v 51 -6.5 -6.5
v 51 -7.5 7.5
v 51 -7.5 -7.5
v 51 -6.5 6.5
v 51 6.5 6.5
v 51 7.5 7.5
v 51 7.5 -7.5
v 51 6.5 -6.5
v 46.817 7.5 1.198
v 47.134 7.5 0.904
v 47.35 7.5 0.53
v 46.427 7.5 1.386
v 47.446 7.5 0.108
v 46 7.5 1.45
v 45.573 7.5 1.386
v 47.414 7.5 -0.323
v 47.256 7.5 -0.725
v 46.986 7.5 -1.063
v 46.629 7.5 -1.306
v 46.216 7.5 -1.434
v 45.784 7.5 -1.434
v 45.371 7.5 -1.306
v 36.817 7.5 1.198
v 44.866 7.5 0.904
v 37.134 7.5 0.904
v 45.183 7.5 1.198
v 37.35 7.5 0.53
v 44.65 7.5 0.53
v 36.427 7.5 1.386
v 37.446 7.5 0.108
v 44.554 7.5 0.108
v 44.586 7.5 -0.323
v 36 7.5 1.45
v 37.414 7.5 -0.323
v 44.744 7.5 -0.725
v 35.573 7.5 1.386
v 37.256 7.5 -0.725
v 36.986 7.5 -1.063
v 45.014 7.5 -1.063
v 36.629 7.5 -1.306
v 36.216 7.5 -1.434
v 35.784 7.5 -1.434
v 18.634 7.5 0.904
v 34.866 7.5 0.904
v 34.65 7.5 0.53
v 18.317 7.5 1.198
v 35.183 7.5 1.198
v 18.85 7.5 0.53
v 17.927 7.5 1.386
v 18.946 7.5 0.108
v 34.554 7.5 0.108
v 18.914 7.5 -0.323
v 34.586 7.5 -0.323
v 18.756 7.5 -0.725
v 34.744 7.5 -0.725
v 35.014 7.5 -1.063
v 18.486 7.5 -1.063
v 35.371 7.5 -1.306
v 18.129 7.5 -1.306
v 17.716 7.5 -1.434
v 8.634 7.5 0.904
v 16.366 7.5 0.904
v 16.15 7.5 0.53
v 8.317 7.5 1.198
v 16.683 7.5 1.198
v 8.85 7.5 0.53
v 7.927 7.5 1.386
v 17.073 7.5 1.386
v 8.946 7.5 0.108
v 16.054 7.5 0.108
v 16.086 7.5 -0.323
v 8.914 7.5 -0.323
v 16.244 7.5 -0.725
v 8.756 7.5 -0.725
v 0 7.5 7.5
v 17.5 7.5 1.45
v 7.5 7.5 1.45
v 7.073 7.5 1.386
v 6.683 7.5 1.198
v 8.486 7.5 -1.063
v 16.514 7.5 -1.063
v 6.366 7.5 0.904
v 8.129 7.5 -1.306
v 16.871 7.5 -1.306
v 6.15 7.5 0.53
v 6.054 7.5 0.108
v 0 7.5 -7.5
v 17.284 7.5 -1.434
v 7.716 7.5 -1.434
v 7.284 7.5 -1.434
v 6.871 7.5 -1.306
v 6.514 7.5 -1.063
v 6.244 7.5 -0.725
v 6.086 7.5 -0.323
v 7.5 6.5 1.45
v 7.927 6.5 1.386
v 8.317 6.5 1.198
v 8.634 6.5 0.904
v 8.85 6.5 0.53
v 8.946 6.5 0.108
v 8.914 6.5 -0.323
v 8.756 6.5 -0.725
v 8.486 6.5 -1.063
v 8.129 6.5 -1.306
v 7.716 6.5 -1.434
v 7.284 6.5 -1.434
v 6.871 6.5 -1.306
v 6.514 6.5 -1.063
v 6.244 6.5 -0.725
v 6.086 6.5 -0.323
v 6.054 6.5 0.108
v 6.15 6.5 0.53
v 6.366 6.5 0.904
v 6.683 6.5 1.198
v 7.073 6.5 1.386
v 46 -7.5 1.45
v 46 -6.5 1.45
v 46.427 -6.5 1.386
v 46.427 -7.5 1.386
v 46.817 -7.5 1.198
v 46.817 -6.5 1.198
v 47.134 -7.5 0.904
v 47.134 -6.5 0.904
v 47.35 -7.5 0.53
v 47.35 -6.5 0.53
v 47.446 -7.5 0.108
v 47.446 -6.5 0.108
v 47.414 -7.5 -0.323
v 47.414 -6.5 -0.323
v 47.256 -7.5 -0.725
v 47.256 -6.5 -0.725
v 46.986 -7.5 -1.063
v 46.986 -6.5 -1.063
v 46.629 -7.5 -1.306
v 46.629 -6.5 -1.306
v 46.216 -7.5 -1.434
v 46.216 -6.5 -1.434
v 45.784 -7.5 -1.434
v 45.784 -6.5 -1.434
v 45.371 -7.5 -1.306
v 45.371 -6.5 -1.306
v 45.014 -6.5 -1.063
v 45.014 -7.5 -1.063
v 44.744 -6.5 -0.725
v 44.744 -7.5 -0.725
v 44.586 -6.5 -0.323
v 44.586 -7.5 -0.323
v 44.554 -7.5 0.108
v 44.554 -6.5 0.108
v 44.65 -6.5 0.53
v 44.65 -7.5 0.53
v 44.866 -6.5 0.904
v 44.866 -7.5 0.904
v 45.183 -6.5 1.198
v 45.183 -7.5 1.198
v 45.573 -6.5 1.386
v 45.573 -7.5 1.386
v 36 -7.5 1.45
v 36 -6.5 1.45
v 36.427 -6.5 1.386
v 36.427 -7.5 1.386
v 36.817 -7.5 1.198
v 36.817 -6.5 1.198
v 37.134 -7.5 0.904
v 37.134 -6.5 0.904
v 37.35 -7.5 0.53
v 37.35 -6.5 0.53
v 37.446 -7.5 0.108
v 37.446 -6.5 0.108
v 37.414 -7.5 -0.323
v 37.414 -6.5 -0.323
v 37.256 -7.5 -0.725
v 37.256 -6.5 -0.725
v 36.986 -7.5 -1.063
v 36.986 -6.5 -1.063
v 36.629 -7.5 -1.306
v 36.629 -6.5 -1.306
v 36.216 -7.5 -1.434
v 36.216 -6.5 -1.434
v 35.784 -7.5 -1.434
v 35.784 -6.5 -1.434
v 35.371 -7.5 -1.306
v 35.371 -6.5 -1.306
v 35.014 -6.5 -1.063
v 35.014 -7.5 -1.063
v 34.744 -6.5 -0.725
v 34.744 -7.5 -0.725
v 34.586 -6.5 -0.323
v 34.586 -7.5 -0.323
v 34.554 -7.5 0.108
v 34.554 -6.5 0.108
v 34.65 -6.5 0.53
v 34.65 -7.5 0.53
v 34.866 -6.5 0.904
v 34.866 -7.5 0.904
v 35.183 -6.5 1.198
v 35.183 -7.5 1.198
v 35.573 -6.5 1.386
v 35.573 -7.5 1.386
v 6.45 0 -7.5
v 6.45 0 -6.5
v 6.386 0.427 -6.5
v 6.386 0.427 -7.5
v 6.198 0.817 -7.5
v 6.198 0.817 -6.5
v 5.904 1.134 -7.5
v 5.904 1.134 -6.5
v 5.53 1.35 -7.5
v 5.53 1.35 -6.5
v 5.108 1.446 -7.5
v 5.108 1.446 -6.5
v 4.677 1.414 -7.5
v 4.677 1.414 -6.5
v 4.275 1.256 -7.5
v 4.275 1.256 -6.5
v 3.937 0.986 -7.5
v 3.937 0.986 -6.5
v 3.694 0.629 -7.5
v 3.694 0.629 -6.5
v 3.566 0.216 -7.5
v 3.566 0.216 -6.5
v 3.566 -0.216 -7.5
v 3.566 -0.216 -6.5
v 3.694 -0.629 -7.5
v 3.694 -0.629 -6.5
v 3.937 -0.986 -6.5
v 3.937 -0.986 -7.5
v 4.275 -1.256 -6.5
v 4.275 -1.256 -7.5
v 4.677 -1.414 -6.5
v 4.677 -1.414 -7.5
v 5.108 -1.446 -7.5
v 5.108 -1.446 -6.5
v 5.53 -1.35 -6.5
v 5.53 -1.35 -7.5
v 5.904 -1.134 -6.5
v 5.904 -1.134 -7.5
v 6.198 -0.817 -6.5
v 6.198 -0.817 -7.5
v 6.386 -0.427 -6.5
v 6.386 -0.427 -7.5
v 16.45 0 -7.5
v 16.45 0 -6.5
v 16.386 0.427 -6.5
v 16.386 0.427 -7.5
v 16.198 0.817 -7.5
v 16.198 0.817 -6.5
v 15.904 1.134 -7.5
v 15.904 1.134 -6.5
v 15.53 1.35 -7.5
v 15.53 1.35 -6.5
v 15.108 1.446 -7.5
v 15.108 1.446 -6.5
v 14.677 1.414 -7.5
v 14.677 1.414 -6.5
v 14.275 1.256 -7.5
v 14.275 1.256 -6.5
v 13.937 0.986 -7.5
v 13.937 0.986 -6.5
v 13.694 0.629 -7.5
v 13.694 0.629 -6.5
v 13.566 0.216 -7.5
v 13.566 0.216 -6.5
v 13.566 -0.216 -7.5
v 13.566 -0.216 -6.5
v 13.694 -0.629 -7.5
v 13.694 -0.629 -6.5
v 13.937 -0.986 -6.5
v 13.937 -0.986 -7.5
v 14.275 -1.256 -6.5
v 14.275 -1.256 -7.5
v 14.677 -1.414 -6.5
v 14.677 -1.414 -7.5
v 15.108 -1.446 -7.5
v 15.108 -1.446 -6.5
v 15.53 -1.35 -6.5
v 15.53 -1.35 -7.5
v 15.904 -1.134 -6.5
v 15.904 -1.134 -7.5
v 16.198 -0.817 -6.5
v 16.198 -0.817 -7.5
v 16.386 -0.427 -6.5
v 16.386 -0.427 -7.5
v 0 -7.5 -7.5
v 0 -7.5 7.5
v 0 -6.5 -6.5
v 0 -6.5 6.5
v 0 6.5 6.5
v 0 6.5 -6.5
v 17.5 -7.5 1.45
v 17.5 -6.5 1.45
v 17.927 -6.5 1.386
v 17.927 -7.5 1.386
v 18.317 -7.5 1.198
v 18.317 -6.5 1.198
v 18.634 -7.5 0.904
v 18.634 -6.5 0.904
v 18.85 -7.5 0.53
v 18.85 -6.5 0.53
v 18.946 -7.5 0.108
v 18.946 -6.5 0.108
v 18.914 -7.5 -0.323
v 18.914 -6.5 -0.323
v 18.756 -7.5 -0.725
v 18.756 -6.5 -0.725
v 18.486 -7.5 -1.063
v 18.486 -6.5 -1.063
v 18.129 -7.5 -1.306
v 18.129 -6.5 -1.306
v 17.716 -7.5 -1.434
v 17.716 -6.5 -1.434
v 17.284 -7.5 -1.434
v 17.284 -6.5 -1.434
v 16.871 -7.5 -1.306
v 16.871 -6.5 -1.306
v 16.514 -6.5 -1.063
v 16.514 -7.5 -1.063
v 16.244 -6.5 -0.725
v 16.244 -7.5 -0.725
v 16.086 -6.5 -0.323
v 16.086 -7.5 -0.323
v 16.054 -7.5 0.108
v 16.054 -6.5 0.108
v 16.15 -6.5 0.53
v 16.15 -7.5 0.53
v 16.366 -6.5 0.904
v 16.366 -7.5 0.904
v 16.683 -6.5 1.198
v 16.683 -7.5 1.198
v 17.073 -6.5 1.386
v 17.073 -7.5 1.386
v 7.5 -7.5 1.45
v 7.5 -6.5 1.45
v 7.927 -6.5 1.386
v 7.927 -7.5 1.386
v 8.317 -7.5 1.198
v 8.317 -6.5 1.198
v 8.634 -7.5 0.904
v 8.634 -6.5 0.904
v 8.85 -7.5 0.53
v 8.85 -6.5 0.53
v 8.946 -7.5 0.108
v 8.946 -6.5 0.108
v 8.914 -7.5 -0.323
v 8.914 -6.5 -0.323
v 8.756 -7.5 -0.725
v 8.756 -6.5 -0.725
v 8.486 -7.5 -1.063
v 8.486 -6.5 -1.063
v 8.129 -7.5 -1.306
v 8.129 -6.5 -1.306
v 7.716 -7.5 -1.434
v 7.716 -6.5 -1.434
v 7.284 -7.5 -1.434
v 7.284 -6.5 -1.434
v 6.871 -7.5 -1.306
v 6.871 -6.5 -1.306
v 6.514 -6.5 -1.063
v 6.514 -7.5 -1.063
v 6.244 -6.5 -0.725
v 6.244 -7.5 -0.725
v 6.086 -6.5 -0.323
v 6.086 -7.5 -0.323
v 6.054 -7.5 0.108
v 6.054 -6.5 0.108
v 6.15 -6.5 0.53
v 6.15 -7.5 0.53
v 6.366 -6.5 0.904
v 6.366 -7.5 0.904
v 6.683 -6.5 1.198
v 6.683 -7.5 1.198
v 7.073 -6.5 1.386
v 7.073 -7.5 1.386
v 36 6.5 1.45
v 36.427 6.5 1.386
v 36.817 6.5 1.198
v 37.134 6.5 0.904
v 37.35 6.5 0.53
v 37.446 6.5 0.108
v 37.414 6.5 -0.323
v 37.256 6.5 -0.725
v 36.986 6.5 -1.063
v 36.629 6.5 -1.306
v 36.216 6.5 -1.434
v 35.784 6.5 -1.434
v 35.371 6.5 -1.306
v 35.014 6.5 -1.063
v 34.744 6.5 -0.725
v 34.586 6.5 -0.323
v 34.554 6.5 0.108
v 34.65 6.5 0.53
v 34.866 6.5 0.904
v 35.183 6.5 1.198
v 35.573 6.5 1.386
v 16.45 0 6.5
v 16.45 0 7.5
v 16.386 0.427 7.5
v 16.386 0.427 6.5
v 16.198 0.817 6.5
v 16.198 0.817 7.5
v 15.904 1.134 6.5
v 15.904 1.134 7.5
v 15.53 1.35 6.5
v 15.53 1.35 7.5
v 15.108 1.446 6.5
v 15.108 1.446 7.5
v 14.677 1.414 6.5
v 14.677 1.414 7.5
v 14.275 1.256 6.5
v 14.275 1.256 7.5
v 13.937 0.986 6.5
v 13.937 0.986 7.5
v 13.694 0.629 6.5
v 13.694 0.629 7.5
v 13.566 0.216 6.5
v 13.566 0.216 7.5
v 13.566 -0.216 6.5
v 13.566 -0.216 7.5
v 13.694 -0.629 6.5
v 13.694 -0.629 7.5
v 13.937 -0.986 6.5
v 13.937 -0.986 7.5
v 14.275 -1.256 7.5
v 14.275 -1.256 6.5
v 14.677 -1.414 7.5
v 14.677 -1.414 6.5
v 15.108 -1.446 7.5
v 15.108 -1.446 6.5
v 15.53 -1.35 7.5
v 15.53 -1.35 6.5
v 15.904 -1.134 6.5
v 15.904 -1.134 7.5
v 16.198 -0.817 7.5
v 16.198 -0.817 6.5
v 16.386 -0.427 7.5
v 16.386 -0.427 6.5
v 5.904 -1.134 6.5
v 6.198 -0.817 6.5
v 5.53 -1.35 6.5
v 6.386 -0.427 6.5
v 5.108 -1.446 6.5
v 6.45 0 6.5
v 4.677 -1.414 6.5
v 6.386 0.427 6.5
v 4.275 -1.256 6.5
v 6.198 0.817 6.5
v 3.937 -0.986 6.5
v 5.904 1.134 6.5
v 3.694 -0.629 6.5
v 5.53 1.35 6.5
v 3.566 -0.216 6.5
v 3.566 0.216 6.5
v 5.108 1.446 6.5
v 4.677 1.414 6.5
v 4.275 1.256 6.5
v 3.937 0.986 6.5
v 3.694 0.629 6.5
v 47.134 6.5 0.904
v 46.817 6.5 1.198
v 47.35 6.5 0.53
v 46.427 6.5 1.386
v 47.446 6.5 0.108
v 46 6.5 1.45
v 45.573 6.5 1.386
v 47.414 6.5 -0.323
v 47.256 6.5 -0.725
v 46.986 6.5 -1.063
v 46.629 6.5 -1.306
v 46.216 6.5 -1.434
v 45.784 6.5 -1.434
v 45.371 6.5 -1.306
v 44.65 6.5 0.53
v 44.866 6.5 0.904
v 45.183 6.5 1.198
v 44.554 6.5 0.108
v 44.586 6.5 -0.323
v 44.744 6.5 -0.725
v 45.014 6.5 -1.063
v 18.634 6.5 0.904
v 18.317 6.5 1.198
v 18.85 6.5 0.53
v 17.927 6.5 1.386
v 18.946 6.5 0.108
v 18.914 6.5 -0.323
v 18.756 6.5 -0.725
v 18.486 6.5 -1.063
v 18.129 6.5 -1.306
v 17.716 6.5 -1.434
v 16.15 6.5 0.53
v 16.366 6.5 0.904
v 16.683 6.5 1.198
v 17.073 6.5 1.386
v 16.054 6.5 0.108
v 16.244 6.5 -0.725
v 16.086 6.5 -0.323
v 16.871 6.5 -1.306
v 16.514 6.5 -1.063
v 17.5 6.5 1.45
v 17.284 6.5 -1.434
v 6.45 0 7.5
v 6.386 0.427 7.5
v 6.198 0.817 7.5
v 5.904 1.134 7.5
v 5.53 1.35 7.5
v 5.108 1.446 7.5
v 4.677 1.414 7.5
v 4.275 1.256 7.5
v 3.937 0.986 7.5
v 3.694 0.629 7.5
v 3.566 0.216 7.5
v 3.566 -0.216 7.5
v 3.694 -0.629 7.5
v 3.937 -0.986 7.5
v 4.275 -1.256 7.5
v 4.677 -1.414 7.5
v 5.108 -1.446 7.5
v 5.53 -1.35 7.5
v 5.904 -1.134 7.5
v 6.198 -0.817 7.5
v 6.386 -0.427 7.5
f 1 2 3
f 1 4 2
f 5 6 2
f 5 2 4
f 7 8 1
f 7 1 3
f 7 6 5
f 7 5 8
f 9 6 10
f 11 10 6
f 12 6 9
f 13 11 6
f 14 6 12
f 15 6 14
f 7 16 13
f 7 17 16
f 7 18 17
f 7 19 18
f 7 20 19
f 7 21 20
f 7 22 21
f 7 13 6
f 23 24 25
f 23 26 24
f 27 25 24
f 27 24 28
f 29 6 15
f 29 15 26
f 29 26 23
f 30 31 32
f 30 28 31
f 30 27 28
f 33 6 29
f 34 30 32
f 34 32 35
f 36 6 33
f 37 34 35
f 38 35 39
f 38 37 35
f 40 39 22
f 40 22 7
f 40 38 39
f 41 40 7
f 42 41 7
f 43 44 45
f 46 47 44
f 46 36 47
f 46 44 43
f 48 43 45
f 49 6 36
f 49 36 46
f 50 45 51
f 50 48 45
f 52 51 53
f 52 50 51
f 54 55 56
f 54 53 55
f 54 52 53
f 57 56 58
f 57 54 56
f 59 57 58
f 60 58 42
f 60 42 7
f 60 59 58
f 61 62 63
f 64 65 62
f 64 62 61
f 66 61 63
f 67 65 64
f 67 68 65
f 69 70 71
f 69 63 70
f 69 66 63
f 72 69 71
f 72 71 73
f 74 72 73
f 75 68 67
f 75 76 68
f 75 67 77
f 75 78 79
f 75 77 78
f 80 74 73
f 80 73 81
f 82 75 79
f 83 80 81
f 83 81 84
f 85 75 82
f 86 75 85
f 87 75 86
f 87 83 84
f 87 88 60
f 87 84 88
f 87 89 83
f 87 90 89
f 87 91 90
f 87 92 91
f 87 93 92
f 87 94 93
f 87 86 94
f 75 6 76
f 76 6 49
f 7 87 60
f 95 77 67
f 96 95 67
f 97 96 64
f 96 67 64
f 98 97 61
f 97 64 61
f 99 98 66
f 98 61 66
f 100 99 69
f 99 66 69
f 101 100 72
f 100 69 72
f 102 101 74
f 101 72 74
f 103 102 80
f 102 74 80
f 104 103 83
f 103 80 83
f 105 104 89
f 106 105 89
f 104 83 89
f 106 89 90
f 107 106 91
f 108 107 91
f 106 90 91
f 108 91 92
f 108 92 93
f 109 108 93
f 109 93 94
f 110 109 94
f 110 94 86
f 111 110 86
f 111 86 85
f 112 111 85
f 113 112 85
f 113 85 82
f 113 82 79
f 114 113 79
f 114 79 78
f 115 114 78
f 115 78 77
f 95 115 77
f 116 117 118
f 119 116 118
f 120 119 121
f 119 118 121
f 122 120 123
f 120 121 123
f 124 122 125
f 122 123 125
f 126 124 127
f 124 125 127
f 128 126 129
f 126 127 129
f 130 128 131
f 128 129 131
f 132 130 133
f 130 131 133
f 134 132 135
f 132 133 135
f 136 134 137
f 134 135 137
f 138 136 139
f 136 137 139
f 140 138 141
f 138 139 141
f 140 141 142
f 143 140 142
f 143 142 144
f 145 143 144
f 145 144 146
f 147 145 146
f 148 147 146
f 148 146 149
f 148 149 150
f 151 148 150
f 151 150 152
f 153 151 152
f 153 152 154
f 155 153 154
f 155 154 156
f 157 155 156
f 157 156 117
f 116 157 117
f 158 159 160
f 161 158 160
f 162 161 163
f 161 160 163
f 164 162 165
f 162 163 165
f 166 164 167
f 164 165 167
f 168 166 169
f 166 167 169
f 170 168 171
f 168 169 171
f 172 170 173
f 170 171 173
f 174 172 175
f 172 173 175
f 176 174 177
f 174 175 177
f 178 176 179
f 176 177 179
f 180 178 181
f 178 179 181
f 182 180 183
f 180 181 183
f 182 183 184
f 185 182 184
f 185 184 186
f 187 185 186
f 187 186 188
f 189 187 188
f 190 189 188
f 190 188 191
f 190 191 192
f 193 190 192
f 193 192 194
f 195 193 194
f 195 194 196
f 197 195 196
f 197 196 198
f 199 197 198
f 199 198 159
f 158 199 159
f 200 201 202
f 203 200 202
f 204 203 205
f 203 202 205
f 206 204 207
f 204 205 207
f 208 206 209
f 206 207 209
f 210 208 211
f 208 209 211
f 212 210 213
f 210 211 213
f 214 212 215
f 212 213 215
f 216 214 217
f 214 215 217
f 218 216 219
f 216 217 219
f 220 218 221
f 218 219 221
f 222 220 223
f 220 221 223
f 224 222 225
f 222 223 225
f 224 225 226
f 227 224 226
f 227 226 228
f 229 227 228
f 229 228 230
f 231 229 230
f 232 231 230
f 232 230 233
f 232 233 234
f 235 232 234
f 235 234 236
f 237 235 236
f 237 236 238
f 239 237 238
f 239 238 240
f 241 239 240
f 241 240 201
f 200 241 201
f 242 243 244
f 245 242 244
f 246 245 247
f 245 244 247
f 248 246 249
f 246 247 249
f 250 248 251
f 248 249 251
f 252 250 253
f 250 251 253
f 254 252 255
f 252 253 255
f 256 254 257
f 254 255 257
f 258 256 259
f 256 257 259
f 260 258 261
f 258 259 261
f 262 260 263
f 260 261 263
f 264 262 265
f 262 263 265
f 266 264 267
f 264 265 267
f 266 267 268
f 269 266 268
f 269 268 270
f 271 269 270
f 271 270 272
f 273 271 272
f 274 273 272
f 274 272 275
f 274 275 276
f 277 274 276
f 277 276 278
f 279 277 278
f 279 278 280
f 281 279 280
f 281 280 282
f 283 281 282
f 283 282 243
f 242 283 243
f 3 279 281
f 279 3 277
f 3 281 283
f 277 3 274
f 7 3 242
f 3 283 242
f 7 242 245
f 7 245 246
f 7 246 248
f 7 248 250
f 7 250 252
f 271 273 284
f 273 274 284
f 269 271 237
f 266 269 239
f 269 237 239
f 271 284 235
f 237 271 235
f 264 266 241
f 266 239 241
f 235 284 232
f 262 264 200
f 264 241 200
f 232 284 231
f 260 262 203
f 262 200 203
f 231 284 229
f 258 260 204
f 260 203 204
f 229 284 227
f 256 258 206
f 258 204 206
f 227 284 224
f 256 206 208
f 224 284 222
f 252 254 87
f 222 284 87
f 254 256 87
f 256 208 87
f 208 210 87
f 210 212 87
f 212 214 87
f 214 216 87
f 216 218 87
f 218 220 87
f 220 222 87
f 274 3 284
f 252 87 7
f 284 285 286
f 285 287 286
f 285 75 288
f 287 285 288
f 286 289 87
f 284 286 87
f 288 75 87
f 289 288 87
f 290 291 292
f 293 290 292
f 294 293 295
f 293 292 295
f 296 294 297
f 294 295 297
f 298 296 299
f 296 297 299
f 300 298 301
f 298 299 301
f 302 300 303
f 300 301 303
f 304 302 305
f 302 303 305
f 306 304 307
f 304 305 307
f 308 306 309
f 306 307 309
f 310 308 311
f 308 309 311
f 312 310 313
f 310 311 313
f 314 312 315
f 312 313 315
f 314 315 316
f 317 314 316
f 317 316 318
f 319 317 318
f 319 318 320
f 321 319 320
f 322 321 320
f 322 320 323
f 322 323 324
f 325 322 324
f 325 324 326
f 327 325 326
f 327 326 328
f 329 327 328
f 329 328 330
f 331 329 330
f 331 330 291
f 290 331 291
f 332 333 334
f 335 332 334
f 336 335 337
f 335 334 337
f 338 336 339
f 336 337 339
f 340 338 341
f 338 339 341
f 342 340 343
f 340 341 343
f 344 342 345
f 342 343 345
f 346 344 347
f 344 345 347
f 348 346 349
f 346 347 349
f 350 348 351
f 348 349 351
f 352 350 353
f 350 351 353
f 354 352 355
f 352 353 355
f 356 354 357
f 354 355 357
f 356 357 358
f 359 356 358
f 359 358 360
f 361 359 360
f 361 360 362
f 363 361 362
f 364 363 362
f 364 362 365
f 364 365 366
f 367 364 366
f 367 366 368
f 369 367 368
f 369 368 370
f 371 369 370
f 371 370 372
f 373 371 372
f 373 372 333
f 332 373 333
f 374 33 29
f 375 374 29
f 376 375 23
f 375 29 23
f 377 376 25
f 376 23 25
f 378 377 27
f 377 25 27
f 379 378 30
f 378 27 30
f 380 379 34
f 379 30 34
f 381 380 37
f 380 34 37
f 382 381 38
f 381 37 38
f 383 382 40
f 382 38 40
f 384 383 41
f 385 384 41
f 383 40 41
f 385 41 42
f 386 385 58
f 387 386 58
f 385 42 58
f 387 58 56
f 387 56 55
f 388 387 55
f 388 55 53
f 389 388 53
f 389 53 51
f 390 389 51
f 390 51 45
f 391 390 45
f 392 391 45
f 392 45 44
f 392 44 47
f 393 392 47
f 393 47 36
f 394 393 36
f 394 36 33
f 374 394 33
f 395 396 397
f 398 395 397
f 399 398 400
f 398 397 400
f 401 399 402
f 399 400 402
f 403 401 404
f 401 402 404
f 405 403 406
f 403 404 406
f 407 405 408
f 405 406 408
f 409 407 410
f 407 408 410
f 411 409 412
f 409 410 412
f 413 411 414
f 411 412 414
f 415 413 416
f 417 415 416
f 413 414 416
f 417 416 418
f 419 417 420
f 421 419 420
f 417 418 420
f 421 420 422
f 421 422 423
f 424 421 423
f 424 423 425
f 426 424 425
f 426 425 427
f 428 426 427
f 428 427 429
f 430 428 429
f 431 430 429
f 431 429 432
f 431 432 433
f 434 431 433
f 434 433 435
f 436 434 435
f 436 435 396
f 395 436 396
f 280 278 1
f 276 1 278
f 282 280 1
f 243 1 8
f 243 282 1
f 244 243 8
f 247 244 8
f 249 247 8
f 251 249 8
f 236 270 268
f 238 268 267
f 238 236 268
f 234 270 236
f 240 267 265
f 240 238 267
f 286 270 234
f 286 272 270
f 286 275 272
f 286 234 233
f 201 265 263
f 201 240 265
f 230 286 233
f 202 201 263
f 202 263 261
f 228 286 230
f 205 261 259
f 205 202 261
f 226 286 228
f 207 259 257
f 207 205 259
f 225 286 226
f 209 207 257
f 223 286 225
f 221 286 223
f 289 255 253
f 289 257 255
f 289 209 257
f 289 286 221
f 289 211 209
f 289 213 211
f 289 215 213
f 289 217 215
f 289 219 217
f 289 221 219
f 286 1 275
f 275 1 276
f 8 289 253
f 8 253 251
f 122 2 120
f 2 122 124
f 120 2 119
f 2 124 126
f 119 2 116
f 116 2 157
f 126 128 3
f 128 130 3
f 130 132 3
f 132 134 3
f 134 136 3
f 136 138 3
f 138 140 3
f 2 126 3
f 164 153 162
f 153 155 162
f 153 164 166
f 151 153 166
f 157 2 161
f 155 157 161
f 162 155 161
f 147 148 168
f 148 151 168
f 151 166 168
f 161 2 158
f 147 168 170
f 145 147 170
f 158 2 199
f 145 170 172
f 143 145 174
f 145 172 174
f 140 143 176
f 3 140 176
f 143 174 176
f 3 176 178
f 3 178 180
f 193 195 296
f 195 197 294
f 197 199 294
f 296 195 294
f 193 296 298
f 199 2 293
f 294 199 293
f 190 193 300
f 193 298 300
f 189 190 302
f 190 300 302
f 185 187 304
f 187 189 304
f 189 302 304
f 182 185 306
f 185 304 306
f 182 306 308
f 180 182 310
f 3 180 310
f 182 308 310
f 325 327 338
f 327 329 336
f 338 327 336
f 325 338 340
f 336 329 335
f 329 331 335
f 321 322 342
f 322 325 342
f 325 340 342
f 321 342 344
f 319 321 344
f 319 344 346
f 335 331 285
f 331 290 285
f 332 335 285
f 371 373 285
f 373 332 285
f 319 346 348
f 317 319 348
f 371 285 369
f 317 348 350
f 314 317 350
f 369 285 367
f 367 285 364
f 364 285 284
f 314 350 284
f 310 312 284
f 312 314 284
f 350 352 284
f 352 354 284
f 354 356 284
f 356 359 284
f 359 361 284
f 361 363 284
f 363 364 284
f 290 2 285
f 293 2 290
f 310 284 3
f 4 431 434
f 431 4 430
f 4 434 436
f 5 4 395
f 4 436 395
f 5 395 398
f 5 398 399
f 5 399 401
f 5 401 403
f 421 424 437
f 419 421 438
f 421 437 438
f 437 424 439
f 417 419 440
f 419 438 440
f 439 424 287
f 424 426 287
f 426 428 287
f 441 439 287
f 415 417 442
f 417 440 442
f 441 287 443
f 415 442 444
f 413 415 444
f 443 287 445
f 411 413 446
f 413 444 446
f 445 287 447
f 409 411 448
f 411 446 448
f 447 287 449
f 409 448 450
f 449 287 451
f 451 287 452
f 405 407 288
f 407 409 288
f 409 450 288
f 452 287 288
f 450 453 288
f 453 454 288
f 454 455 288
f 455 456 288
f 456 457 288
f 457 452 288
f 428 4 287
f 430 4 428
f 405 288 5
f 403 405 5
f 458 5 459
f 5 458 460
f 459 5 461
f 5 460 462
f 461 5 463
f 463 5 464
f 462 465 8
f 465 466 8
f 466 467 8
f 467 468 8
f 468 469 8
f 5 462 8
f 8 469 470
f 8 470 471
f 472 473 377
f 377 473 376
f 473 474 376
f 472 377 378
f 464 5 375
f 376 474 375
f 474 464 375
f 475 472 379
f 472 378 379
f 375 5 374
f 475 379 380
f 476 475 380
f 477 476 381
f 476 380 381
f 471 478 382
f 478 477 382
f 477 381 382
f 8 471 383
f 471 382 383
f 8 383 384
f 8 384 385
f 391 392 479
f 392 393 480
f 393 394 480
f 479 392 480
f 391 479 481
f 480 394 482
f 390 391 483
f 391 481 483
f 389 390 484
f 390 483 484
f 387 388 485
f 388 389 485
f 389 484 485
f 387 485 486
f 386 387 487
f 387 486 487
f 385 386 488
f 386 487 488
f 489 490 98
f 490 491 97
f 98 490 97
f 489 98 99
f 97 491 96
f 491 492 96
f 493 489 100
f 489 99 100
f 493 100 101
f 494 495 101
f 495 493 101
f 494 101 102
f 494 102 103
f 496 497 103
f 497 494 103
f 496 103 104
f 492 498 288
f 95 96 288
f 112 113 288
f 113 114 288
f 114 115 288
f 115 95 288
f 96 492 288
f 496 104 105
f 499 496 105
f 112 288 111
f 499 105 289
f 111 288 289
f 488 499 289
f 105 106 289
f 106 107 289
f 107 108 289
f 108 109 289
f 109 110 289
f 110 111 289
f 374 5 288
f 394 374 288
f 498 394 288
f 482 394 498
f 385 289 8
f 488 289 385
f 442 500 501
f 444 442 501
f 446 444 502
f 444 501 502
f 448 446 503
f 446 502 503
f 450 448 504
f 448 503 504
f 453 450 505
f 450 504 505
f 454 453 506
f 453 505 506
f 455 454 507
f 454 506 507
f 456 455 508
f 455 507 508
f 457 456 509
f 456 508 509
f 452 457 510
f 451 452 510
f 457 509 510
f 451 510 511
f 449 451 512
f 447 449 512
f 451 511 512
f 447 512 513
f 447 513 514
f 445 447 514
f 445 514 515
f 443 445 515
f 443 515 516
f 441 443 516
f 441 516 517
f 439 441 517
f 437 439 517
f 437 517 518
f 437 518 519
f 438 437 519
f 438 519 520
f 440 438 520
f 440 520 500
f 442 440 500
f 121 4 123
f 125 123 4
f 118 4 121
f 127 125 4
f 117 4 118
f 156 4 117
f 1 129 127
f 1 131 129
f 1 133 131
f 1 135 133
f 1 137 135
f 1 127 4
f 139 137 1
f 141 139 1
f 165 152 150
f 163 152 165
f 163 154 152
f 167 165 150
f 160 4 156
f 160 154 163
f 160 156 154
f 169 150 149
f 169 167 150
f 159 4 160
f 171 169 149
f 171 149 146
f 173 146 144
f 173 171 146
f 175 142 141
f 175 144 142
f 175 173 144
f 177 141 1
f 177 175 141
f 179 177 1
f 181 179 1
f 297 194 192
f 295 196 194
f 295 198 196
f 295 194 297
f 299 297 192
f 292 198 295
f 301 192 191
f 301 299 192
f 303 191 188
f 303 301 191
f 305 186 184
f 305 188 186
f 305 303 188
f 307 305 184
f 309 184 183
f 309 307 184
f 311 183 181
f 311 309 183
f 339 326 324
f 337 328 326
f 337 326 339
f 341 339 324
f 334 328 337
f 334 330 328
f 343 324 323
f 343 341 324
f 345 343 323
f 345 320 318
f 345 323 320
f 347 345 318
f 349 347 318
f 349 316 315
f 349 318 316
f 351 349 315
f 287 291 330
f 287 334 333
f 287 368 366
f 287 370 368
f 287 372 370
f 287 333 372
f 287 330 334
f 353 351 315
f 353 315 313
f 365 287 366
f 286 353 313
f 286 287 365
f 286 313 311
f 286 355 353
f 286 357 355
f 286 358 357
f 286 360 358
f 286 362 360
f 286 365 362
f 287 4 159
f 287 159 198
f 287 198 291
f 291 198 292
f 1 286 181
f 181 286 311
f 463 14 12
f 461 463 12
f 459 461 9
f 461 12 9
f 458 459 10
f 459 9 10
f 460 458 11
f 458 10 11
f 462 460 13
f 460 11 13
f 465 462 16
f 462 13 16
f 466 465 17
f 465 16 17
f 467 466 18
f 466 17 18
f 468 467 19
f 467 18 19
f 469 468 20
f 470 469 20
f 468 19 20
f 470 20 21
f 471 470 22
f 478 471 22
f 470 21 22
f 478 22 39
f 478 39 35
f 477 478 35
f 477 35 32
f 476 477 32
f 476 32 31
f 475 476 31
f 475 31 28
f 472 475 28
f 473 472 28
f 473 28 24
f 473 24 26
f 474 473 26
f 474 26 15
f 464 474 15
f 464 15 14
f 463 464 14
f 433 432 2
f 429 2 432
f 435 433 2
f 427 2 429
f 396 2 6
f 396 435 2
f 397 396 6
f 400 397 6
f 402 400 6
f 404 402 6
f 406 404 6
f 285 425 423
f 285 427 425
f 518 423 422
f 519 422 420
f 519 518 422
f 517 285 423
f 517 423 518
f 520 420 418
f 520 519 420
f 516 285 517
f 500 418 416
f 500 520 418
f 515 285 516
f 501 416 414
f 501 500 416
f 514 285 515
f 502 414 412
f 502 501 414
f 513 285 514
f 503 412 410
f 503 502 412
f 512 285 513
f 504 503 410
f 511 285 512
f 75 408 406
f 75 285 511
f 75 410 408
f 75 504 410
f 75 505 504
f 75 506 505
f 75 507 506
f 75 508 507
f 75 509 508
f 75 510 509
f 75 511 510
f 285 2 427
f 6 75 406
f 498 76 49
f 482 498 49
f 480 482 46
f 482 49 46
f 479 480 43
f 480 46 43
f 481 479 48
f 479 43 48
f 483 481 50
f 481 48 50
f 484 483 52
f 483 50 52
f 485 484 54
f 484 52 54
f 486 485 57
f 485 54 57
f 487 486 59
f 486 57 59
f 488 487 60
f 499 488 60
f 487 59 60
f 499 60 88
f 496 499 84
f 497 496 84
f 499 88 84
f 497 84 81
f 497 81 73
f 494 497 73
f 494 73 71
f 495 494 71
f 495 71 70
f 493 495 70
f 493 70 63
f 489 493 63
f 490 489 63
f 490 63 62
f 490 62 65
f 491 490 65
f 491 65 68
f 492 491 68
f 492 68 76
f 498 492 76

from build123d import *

# Parameters (mm, degrees)
SKETCH_1_W          = 15
SKETCH_1_H          = 15
SKETCH_1_W_2        = 13
SKETCH_1_H_2        = 13
EXTRUDE_1_DEPTH     = 51
SKETCH_2_R          = 1.45
CUT_EXTRUDE_1_DEPTH = 54.686590505
SKETCH_3_R          = 1.45
CUT_EXTRUDE_2_DEPTH = 54.686590505


with BuildPart() as part:
    # 草图1 → 凸台-拉伸1 (new body)
    with BuildSketch(Plane(origin=(0, 0, 0), x_dir=(0, 0, -1), z_dir=(1, 0, 0))):
        Rectangle(SKETCH_1_W, SKETCH_1_H)
        Rectangle(SKETCH_1_W_2, SKETCH_1_H_2, mode=Mode.SUBTRACT)
    extrude(amount=EXTRUDE_1_DEPTH)

    # 草图2 → 切除-拉伸1 (cut, through all)
    with BuildSketch(Plane(origin=(0, 7.5, 0), x_dir=(1, 0, 0), z_dir=(0, 1, 0))):
        with Locations(Location((7.5, 0, 0), (0, 0, 270))):
            Circle(SKETCH_2_R)
        with Locations(Location((17.5, 0, 0), (0, 0, 270))):
            Circle(SKETCH_2_R)
        with Locations(Location((46, 0, 0), (0, 0, 270))):
            Circle(SKETCH_2_R)
        with Locations(Location((36, 0, 0), (0, 0, 270))):
            Circle(SKETCH_2_R)
    extrude(amount=-CUT_EXTRUDE_1_DEPTH, mode=Mode.SUBTRACT)

    # 草图3 → 切除-拉伸2 (cut, through all)
    with BuildSketch(Plane.XY.offset(7.5)):
        with Locations((5, 0)):
            Circle(SKETCH_3_R)
        with Locations((15, 0)):
            Circle(SKETCH_3_R)
    extrude(amount=-CUT_EXTRUDE_2_DEPTH, mode=Mode.SUBTRACT)


solid = part.part
